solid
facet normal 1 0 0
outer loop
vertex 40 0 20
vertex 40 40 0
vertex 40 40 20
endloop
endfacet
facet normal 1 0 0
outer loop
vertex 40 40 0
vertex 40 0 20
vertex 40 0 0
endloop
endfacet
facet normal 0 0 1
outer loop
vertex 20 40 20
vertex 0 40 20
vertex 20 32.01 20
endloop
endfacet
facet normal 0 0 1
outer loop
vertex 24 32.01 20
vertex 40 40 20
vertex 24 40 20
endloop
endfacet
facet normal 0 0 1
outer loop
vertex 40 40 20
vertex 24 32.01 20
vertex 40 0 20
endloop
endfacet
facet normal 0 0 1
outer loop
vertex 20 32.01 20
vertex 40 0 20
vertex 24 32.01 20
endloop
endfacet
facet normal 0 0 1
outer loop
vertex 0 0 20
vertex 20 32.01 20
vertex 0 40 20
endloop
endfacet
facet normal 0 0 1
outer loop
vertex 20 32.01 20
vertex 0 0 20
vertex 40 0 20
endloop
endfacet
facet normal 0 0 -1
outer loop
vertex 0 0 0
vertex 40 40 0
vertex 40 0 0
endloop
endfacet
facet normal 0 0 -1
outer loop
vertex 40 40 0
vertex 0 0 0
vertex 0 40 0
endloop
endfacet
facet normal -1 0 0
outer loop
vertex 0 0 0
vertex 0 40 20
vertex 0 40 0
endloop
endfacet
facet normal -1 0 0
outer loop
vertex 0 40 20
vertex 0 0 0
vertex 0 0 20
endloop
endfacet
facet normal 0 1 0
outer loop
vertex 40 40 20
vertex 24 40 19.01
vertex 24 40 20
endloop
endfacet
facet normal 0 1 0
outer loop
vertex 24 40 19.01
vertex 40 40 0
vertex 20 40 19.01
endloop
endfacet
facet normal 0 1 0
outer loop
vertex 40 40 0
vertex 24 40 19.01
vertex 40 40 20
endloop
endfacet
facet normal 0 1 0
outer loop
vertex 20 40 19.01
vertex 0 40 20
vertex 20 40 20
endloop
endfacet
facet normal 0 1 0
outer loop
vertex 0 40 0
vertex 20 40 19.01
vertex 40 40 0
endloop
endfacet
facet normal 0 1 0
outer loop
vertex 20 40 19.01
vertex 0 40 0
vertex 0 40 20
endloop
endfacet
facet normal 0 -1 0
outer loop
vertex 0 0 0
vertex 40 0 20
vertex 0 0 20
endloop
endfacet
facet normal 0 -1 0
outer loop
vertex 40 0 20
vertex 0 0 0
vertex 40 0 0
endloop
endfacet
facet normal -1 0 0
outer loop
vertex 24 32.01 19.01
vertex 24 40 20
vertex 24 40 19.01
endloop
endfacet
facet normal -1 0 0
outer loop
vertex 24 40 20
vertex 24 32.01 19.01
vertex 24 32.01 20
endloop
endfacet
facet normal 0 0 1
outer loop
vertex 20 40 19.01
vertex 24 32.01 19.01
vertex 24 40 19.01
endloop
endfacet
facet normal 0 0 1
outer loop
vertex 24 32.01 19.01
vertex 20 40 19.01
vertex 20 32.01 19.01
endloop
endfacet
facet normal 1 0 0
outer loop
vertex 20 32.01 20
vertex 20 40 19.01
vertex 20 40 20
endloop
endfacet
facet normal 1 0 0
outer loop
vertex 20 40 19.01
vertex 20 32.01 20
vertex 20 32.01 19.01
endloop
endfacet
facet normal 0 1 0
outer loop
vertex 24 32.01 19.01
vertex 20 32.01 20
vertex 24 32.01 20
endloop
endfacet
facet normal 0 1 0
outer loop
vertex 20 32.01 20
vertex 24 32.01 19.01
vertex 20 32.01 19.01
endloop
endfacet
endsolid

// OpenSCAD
cubert(40, 40, 20, 1);

module cubert(h, w, d, nd) {
	difference() {
		cube([h, w, d], center = false);
		// notch
		translate([h / 2, w - w / 5 + 0.01, d - nd + 0.01]) cube([h / 10, w / 5, nd]);
	}
}
